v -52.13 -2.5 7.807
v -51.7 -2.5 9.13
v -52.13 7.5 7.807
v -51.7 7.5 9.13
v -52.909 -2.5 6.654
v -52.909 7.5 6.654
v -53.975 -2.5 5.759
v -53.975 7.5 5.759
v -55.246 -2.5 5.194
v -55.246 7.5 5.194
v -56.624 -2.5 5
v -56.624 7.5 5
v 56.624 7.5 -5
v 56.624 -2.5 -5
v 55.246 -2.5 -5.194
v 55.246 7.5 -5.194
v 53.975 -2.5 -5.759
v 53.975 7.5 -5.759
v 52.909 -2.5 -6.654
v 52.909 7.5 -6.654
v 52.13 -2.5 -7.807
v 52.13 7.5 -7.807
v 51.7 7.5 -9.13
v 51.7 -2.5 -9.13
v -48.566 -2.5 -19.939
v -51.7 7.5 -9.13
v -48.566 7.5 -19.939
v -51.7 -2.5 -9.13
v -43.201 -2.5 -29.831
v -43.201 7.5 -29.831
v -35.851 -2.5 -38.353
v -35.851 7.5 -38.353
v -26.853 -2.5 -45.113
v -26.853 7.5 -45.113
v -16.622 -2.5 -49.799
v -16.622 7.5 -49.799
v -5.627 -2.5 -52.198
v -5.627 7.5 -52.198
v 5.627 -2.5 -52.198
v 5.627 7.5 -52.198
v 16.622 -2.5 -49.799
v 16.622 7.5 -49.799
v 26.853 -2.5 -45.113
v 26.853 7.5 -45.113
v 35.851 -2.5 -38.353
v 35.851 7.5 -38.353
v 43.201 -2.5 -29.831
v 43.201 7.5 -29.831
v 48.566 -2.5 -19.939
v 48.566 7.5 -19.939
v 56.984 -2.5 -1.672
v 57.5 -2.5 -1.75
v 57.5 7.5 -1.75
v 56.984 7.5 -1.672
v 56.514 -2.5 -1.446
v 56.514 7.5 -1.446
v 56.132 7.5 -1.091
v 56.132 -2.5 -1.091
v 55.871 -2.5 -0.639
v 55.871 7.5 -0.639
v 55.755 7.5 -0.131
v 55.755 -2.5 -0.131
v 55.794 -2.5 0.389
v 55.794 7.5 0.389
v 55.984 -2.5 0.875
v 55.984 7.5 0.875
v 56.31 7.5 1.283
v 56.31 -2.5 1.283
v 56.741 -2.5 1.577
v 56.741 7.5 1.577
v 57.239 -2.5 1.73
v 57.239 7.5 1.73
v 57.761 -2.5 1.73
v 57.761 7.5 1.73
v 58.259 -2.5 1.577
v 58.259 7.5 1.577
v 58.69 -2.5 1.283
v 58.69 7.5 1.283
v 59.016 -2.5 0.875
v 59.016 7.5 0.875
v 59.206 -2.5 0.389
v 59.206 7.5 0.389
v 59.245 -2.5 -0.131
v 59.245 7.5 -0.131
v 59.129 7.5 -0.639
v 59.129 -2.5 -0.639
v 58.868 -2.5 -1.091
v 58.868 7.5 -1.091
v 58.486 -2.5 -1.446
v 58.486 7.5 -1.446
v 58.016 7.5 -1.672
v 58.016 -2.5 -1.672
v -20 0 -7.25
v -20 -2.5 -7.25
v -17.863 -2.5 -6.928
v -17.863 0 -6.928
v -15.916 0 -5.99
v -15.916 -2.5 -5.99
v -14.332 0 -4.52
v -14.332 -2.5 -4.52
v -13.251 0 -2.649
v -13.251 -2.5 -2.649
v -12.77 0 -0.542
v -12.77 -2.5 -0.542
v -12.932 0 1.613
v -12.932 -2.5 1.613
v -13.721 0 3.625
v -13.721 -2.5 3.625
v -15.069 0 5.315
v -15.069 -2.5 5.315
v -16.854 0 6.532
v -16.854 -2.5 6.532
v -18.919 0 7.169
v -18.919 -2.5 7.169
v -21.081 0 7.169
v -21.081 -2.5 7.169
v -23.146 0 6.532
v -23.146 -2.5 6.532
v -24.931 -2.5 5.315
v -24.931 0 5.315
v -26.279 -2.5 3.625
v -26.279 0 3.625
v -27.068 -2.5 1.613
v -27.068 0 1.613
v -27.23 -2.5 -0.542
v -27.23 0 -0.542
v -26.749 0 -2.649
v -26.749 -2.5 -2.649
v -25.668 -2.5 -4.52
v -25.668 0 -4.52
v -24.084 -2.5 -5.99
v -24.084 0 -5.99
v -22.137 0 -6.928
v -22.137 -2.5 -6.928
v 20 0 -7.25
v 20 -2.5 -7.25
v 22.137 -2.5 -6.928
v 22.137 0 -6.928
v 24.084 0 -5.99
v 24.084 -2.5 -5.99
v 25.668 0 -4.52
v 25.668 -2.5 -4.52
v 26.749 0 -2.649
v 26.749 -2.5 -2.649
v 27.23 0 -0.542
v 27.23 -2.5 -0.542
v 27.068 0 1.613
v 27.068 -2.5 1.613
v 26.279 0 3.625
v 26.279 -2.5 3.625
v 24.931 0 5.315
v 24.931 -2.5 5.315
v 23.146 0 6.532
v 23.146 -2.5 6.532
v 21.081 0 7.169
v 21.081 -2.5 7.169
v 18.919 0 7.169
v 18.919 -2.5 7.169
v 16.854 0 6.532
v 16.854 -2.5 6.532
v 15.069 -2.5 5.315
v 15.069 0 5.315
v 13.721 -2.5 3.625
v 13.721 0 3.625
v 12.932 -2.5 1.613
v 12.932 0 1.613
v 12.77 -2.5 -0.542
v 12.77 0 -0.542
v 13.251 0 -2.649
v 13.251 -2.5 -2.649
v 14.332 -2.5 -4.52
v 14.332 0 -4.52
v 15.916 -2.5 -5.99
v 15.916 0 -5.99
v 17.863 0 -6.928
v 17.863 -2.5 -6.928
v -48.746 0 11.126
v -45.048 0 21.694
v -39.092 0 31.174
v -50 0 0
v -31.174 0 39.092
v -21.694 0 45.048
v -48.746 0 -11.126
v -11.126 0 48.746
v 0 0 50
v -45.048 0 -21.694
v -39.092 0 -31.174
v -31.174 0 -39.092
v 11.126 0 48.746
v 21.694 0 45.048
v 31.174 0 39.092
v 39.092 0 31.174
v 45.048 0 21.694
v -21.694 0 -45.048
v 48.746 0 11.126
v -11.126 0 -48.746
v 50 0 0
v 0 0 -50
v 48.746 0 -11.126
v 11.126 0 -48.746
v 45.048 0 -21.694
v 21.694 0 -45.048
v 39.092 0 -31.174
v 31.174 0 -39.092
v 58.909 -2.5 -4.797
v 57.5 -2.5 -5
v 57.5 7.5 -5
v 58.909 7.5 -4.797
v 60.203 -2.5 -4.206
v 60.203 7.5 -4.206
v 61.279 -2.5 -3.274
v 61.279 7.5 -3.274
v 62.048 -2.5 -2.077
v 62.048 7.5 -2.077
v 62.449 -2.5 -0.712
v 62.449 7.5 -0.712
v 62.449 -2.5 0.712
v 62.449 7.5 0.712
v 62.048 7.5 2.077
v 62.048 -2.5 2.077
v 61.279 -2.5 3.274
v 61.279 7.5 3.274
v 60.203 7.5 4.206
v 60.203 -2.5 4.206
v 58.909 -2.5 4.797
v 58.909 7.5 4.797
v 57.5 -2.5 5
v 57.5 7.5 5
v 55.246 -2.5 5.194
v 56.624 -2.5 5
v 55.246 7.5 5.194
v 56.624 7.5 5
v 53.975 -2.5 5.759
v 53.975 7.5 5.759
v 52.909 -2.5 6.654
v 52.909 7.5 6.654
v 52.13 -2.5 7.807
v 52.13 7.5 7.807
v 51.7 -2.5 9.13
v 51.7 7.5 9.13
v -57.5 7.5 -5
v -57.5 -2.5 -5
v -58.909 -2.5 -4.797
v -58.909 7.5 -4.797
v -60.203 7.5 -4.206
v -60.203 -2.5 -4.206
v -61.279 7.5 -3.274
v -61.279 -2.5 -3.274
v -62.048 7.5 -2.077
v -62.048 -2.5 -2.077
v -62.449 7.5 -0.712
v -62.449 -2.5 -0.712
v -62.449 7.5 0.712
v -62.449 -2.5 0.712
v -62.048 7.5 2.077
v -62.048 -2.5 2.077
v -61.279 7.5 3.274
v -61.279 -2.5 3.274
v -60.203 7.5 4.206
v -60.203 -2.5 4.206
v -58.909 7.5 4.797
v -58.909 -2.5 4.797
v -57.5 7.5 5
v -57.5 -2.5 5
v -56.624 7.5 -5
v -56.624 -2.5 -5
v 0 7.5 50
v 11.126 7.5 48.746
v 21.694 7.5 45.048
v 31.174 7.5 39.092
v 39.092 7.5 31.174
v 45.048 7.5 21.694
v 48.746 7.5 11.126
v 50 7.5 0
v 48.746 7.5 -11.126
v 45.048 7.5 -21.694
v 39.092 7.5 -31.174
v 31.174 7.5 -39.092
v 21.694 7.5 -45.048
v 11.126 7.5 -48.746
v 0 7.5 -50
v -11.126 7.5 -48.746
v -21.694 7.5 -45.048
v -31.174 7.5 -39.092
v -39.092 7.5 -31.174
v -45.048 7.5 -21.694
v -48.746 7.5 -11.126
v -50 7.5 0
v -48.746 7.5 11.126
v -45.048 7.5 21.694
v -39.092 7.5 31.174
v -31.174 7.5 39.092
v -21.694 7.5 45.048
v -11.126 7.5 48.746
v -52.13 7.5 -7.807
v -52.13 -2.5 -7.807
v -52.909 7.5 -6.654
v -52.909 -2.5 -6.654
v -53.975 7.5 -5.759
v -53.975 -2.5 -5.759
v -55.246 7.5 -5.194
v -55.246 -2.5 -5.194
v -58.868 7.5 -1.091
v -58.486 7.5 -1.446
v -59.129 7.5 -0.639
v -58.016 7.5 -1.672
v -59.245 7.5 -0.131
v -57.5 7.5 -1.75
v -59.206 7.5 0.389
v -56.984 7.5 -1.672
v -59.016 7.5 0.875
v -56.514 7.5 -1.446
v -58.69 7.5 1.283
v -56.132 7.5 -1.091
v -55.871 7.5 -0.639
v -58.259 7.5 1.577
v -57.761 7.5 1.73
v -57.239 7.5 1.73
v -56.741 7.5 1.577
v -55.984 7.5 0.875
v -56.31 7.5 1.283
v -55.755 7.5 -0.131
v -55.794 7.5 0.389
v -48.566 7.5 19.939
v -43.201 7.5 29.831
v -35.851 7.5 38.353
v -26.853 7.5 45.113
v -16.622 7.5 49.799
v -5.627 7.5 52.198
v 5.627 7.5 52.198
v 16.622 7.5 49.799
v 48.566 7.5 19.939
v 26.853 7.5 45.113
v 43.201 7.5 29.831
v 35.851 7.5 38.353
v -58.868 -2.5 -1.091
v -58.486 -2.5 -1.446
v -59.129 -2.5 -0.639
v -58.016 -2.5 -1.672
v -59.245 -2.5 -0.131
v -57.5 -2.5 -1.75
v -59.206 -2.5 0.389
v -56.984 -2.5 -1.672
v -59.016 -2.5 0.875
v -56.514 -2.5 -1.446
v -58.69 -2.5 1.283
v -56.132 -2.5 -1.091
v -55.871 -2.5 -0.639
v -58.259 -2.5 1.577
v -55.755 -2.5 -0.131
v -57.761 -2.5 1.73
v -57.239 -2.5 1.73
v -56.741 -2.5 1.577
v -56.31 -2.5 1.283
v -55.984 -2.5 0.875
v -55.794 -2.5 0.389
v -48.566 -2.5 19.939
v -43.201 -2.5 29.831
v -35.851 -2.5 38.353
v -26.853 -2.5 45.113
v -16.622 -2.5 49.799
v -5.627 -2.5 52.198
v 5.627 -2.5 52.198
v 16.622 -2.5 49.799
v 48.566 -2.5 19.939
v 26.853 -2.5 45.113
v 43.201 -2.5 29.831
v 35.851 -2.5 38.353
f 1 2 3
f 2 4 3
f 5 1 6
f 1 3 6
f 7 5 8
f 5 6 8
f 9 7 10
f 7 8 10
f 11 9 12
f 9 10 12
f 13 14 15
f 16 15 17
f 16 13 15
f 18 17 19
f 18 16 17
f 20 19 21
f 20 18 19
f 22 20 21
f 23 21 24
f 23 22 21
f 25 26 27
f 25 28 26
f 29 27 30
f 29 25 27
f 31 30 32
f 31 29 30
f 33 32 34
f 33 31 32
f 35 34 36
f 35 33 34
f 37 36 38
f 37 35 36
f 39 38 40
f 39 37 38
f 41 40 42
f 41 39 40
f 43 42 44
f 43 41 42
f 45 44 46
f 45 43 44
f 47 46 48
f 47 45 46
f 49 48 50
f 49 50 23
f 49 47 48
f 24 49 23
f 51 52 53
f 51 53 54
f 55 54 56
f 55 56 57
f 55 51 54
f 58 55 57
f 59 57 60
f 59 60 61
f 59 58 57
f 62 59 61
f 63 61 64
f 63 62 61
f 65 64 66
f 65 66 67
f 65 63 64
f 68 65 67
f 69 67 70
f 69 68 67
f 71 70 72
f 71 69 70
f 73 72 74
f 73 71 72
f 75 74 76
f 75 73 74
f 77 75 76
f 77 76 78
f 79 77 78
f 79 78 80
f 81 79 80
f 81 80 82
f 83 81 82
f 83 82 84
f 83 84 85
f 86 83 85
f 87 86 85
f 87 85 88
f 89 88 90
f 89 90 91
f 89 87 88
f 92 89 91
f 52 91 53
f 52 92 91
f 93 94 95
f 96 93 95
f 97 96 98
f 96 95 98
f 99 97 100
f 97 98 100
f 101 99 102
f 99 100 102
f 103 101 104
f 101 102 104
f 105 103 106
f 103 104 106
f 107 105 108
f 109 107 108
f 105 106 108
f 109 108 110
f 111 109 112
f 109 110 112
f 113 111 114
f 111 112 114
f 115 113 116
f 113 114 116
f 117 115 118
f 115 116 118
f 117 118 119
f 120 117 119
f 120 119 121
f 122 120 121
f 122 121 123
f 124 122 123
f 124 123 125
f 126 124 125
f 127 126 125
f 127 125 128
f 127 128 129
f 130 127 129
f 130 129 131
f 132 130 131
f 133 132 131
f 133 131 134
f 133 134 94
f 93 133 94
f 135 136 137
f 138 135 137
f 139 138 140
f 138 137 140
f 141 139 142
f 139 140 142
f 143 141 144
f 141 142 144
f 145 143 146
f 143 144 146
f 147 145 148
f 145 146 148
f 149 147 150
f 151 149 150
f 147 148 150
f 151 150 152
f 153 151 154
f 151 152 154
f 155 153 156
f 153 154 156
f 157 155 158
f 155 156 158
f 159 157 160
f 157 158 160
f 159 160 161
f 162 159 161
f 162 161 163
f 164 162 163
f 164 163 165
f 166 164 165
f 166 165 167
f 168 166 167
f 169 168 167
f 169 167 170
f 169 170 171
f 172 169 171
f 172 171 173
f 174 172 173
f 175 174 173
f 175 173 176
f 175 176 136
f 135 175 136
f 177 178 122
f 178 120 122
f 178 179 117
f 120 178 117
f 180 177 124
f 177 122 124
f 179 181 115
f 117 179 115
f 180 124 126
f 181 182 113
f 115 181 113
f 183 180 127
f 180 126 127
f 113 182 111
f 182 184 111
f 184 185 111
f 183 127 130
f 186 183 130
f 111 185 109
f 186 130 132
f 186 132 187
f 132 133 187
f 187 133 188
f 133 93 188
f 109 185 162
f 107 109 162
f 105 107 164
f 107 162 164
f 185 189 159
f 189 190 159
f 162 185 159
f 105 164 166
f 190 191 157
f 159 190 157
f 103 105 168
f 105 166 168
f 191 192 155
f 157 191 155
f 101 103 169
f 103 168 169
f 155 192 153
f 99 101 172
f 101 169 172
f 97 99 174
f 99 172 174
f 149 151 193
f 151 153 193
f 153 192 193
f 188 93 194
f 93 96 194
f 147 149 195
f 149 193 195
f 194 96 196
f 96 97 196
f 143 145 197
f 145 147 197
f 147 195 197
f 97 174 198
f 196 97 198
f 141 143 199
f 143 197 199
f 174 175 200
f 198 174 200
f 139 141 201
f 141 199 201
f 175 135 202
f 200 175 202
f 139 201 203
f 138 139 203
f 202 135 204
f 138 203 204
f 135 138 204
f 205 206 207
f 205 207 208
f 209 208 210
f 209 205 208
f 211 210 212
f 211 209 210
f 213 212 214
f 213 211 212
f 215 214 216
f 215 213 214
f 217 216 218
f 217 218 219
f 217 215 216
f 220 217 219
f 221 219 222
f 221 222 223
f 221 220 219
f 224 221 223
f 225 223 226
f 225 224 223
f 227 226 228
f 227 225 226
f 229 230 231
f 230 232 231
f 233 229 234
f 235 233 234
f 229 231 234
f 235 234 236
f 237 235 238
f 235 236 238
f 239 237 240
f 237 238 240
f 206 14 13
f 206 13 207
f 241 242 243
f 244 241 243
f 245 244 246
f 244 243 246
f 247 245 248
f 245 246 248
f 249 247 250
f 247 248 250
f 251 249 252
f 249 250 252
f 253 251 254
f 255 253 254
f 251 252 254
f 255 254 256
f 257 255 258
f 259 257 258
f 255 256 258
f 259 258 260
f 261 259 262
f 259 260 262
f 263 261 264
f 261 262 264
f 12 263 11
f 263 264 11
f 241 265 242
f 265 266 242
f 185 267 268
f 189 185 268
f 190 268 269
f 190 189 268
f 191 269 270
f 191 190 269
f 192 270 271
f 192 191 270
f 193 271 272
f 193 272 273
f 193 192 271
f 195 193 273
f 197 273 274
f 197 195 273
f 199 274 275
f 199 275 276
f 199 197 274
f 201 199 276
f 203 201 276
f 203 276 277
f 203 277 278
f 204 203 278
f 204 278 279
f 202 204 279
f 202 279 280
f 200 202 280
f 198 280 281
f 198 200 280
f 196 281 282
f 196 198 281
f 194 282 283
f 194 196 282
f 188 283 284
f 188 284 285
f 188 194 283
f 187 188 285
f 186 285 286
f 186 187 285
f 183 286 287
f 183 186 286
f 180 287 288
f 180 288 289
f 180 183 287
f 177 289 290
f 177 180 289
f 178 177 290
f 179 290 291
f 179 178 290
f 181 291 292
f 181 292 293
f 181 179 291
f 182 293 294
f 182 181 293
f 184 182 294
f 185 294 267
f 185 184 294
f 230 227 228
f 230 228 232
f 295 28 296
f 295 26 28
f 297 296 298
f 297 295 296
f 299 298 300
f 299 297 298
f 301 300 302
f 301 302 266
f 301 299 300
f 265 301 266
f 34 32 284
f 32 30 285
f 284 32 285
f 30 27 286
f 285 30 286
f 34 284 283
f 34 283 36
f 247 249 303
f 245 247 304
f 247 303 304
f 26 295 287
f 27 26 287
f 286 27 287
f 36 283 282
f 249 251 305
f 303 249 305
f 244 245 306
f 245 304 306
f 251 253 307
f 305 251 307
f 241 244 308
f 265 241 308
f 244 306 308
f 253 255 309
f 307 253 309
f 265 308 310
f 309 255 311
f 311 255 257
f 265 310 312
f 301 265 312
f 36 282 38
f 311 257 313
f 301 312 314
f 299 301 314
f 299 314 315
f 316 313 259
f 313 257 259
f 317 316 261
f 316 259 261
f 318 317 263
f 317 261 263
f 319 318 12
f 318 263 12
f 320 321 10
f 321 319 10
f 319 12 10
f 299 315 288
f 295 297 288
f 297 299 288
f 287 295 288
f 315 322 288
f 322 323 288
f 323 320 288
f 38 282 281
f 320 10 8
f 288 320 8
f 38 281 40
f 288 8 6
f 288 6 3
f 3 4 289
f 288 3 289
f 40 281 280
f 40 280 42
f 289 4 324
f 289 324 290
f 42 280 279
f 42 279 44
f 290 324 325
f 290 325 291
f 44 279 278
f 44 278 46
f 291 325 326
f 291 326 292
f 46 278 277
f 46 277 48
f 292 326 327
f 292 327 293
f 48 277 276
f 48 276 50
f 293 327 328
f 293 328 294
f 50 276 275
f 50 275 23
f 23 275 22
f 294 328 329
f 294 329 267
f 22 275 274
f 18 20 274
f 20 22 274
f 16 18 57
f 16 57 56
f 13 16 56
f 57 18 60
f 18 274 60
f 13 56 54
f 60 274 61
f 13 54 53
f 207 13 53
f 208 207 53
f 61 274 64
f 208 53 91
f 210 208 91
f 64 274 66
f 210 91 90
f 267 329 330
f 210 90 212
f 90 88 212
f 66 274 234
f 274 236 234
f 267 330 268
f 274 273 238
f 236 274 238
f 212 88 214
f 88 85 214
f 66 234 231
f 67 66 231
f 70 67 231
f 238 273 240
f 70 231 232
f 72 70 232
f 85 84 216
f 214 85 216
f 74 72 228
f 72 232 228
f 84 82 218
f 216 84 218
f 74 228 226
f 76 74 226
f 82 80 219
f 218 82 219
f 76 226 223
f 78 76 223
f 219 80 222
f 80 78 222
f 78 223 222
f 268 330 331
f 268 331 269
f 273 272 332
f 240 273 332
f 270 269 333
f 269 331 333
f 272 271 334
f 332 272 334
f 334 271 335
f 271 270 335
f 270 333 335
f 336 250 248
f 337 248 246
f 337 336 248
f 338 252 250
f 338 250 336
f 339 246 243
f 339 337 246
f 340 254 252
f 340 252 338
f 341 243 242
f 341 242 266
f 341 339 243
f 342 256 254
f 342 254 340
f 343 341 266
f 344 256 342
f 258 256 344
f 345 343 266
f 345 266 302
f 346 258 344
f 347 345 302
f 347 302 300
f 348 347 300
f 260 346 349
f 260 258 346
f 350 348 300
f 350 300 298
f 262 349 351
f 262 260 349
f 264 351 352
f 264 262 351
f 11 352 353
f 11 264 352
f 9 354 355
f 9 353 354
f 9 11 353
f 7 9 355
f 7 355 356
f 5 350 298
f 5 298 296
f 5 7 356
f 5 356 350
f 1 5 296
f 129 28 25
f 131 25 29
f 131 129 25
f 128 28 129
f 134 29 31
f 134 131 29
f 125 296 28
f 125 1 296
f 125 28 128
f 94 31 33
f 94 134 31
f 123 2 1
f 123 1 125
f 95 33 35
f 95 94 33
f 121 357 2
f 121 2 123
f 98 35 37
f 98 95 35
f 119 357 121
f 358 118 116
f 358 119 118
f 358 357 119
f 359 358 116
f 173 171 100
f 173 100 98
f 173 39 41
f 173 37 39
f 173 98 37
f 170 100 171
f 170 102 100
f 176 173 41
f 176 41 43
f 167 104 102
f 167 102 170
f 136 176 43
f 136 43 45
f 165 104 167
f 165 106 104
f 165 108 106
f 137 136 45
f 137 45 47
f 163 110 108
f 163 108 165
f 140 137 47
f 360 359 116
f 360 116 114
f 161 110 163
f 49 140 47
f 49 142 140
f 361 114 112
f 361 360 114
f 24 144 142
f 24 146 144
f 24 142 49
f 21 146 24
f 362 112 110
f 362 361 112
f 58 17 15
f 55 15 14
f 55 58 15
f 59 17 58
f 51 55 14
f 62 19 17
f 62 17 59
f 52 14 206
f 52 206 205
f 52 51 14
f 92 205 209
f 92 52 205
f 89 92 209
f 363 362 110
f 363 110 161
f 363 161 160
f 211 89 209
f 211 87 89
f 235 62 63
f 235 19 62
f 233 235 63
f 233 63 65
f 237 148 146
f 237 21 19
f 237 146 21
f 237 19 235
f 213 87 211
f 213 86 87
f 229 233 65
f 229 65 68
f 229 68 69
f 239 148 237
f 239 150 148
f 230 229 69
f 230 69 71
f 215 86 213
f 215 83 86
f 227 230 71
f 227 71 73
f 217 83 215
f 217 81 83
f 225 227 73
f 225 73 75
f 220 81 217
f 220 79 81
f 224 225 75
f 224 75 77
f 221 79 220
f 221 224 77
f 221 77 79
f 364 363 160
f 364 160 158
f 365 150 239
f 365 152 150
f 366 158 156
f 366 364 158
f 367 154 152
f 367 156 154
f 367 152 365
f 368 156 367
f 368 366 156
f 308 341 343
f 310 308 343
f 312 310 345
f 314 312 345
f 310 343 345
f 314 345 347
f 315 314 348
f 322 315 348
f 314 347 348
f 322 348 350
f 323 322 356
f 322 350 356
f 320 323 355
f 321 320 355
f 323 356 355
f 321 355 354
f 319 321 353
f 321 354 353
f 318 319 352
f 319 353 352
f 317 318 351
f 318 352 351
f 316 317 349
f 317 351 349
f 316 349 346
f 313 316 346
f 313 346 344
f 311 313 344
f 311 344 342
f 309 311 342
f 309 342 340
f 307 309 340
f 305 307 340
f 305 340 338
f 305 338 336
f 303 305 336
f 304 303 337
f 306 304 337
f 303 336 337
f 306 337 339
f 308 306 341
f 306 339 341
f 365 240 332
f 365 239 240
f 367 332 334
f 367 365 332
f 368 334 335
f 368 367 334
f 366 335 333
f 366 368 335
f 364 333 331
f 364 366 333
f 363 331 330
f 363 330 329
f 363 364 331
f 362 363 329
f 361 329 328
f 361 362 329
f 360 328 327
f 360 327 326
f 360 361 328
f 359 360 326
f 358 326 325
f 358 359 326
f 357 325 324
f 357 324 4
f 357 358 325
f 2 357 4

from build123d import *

# Parameters (mm, degrees)
SKETCH1_R           = 52.5
SKETCH1_R_2         = 50
BOSS_EXTRUDE1_DEPTH = 7.5
BOSS_EXTRUDE2_START = 2.5
SKETCH2_R           = 52.5
BOSS_EXTRUDE2_DEPTH = 2.5
SKETCH3_R           = 7.25
CUT_EXTRUDE1_DEPTH  = 75.916620319
SKETCH4_R           = 1.75
BOSS_EXTRUDE3_DEPTH = 10
FILLET1_R           = 5


with BuildPart() as part:
    # Sketch1 → Boss-Extrude1 (new body)
    with BuildSketch(Plane(origin=(0, 0, 0), x_dir=(1, 0, 0), z_dir=(0, 1, 0))):
        with Locations(Location((0, 0, 0), (0, 0, 270))):
            Circle(SKETCH1_R)
        with Locations(Location((0, 0, 0), (0, 0, 270))):
            Circle(SKETCH1_R_2, mode=Mode.SUBTRACT)
    extrude(amount=BOSS_EXTRUDE1_DEPTH)

    # Sketch2 → Boss-Extrude2 (add)
    with BuildSketch(Plane.XZ.offset(BOSS_EXTRUDE2_START)):
        with Locations(Location((0, 0, 0), (0, 0, 270))):
            Circle(SKETCH2_R)
    extrude(amount=-BOSS_EXTRUDE2_DEPTH)

    # Sketch3 → Cut-Extrude1 (cut, through all)
    with BuildSketch(Plane.XZ.offset(2.5)):
        with Locations(Location((20, 0, 0), (0, 0, 270))):
            Circle(SKETCH3_R)
        with Locations(Location((-20, 0, 0), (0, 0, 270))):
            Circle(SKETCH3_R)
    extrude(amount=-CUT_EXTRUDE1_DEPTH, mode=Mode.SUBTRACT)

    # Sketch4 → Boss-Extrude3 (add)
    with BuildSketch(Plane.XZ.offset(2.5)):
        with BuildLine():
            Line((-57.5, 5), (-52.261362401, 5))
            Line((-52.261362401, 5), (-51.658599185, 0))
            Line((-51.658599185, 0), (-52.261362401, -5))
            Line((-52.261362401, -5), (-57.5, -5))
            ThreePointArc((-57.5, -5), (-62.5, 0), (-57.5, 5))
        make_face()
        with Locations(Location((-57.5, 0, 0), (0, 0, 270))):
            Circle(SKETCH4_R, mode=Mode.SUBTRACT)
    boss_extrude3 = extrude(amount=-BOSS_EXTRUDE3_DEPTH)

    # Mirror1: Boss-Extrude3 across plane
    add(boss_extrude3.mirror(Plane(origin=(0, 0, 0), x_dir=(0, 0, 1), z_dir=(1, 0, 0))))

    # Fillet1
    fillet1_edges = [part.edges().sort_by_distance(p)[0] for p in [
        (-52.261362401, 2.5, 5),
        (-52.261362401, 2.5, -5),
        (52.261362401, 2.5, 5),
        (52.261362401, 2.5, -5),
    ]]
    fillet(fillet1_edges, radius=FILLET1_R)


solid = part.part
